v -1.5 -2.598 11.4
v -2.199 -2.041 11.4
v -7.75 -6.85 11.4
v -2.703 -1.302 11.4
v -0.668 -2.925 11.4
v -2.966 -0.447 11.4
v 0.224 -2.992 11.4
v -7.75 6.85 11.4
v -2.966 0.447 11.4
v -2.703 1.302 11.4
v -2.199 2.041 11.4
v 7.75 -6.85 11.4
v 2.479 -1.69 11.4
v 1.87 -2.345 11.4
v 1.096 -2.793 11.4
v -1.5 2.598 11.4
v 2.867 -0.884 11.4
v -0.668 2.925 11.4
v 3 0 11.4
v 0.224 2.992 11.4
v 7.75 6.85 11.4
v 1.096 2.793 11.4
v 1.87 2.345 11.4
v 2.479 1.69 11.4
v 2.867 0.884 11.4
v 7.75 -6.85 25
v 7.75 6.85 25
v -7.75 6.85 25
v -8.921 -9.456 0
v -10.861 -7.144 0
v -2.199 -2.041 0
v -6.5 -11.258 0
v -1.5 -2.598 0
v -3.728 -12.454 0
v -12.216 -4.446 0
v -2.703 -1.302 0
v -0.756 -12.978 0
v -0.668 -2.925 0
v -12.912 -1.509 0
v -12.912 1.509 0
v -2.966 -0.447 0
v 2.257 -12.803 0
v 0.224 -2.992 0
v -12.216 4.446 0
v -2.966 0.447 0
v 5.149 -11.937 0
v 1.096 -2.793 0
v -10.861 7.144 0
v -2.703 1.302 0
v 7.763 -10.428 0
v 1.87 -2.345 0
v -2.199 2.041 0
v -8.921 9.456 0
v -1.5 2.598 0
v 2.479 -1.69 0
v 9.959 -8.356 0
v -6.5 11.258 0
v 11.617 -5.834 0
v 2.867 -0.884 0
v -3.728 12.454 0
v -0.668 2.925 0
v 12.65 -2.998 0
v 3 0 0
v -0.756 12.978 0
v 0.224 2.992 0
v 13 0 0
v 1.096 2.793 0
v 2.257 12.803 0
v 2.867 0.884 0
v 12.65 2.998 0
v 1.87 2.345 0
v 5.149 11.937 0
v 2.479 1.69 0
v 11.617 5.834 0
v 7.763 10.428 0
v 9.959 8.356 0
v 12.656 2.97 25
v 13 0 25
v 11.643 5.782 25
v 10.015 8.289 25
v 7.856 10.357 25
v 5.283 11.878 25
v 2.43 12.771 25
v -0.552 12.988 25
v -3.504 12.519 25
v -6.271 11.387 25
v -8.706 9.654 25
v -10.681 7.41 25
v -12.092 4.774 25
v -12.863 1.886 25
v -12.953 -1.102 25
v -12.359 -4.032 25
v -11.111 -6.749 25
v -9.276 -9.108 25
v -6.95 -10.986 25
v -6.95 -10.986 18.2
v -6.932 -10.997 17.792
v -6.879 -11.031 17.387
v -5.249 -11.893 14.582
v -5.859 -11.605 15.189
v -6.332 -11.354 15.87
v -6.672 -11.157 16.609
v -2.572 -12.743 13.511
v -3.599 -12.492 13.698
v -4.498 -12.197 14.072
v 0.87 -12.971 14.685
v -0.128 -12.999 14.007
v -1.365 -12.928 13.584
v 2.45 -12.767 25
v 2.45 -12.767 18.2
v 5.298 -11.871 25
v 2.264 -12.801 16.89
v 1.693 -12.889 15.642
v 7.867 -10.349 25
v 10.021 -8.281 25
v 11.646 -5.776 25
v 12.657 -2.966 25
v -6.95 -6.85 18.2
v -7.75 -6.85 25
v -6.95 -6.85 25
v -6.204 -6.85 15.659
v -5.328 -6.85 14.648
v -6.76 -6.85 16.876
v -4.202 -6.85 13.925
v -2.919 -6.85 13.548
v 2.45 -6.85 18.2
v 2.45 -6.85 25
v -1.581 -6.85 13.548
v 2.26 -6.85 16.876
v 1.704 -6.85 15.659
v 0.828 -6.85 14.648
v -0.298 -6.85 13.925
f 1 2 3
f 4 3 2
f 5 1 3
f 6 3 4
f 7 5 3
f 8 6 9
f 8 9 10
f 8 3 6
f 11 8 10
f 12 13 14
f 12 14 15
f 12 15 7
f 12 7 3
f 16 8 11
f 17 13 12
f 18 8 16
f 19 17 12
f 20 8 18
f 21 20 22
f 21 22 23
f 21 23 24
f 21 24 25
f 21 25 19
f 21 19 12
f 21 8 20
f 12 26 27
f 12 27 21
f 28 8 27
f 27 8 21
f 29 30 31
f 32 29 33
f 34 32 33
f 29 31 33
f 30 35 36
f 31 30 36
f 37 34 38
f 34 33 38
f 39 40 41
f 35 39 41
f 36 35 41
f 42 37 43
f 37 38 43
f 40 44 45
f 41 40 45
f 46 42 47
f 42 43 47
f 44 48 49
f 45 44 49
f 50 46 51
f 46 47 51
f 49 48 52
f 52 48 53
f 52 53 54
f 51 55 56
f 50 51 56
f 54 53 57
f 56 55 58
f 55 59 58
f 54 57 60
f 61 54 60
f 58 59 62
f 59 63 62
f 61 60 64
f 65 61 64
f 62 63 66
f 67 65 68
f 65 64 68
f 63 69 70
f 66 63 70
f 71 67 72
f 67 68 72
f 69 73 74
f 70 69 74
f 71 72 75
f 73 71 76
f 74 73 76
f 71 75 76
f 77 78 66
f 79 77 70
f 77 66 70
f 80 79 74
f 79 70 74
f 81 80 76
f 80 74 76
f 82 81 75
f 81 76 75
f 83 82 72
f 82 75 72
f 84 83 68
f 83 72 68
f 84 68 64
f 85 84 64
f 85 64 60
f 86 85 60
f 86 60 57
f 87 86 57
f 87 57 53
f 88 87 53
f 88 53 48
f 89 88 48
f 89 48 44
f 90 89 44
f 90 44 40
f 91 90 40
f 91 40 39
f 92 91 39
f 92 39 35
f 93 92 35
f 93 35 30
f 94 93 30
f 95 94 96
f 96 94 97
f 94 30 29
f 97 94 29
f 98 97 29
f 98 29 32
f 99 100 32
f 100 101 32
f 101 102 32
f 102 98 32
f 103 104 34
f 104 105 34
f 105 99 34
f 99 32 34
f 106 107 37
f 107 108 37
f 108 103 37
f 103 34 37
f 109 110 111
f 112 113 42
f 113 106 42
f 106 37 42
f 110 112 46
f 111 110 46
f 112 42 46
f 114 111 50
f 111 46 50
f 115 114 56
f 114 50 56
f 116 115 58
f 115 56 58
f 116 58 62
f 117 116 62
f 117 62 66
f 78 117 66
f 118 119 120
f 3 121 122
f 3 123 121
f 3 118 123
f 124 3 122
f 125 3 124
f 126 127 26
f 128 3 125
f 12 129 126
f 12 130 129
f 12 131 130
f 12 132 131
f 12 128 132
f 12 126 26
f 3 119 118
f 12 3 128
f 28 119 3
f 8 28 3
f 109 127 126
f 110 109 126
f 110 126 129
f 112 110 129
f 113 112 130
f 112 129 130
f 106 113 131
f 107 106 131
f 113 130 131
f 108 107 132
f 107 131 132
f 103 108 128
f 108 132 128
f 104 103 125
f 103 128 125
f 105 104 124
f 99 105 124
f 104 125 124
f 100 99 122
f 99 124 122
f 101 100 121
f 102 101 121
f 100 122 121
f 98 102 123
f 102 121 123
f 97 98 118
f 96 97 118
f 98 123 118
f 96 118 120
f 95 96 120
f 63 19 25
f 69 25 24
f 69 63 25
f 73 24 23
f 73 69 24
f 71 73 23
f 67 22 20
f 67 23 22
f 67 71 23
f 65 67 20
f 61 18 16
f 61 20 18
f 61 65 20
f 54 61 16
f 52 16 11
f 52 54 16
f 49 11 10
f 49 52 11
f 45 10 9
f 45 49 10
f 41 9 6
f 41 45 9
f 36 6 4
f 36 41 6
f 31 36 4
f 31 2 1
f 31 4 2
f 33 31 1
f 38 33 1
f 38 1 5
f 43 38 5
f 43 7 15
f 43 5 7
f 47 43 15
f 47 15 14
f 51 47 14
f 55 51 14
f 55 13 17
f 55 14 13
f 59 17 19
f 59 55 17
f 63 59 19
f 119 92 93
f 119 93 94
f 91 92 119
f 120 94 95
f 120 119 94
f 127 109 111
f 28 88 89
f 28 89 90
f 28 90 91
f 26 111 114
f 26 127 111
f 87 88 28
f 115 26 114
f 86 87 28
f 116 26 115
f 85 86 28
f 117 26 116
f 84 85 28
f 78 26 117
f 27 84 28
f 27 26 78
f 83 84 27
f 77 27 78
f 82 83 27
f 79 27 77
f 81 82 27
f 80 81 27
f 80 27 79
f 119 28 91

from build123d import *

# Parameters (mm, degrees)
SKETCH1_R               = 13
SKETCH1_R_2             = 3
BOSS_EXTRUDE1_DEPTH     = 25
SKETCH2_W               = 15.5
SKETCH2_H               = 13.6
CUT_EXTRUDE1_DEPTH      = 6.85
CUT_EXTRUDE2_REACH      = 33.032
CUT_EXTRUDE2_END_RADIUS = 13


with BuildPart() as part:
    # Sketch1 → Boss-Extrude1 (new body)
    with BuildSketch(Plane.XY):
        Circle(SKETCH1_R)
        Circle(SKETCH1_R_2, mode=Mode.SUBTRACT)
    extrude(amount=BOSS_EXTRUDE1_DEPTH)

    # Sketch2 → Cut-Extrude1 (cut, symmetric)
    with BuildSketch(Plane(origin=(0, 0, 0), x_dir=(1, 0, 0), z_dir=(0, 1, 0))):
        with Locations((0, -18.2)):
            Rectangle(SKETCH2_W, SKETCH2_H)
    extrude(amount=CUT_EXTRUDE1_DEPTH, both=True, mode=Mode.SUBTRACT)

    # Cut-Extrude2: up to this cylinder (the profile starts inside it)
    cut_extrude2_end = Plane(origin=(0, 0, 19.701869), z_dir=(0, 0, -1)) * Cylinder(CUT_EXTRUDE2_END_RADIUS, 93.064, mode=Mode.PRIVATE)
    # Sketch3 → Cut-Extrude2 (cut, up to the surface)
    with BuildSketch(Plane(origin=(0, 0, 0), x_dir=(1, 0, 0), z_dir=(0, 1, 0)), mode=Mode.PRIVATE) as cut_extrude2_sk1:
        with BuildLine():
            Line((-6.95, -18.2), (-6.95, -25))
            Line((-6.95, -25), (2.45, -25))
            Line((2.45, -25), (2.45, -18.2))
            ThreePointArc((2.45, -18.2), (-2.25, -13.5), (-6.95, -18.2))
        make_face()
    cut_extrude2_tool1 = extrude(cut_extrude2_sk1.sketch, amount=-CUT_EXTRUDE2_REACH, mode=Mode.PRIVATE) & cut_extrude2_end
    add(cut_extrude2_tool1.solids().sort_by_distance((-2.25, 0, 19.701869))[0], mode=Mode.SUBTRACT)


solid = part.part
